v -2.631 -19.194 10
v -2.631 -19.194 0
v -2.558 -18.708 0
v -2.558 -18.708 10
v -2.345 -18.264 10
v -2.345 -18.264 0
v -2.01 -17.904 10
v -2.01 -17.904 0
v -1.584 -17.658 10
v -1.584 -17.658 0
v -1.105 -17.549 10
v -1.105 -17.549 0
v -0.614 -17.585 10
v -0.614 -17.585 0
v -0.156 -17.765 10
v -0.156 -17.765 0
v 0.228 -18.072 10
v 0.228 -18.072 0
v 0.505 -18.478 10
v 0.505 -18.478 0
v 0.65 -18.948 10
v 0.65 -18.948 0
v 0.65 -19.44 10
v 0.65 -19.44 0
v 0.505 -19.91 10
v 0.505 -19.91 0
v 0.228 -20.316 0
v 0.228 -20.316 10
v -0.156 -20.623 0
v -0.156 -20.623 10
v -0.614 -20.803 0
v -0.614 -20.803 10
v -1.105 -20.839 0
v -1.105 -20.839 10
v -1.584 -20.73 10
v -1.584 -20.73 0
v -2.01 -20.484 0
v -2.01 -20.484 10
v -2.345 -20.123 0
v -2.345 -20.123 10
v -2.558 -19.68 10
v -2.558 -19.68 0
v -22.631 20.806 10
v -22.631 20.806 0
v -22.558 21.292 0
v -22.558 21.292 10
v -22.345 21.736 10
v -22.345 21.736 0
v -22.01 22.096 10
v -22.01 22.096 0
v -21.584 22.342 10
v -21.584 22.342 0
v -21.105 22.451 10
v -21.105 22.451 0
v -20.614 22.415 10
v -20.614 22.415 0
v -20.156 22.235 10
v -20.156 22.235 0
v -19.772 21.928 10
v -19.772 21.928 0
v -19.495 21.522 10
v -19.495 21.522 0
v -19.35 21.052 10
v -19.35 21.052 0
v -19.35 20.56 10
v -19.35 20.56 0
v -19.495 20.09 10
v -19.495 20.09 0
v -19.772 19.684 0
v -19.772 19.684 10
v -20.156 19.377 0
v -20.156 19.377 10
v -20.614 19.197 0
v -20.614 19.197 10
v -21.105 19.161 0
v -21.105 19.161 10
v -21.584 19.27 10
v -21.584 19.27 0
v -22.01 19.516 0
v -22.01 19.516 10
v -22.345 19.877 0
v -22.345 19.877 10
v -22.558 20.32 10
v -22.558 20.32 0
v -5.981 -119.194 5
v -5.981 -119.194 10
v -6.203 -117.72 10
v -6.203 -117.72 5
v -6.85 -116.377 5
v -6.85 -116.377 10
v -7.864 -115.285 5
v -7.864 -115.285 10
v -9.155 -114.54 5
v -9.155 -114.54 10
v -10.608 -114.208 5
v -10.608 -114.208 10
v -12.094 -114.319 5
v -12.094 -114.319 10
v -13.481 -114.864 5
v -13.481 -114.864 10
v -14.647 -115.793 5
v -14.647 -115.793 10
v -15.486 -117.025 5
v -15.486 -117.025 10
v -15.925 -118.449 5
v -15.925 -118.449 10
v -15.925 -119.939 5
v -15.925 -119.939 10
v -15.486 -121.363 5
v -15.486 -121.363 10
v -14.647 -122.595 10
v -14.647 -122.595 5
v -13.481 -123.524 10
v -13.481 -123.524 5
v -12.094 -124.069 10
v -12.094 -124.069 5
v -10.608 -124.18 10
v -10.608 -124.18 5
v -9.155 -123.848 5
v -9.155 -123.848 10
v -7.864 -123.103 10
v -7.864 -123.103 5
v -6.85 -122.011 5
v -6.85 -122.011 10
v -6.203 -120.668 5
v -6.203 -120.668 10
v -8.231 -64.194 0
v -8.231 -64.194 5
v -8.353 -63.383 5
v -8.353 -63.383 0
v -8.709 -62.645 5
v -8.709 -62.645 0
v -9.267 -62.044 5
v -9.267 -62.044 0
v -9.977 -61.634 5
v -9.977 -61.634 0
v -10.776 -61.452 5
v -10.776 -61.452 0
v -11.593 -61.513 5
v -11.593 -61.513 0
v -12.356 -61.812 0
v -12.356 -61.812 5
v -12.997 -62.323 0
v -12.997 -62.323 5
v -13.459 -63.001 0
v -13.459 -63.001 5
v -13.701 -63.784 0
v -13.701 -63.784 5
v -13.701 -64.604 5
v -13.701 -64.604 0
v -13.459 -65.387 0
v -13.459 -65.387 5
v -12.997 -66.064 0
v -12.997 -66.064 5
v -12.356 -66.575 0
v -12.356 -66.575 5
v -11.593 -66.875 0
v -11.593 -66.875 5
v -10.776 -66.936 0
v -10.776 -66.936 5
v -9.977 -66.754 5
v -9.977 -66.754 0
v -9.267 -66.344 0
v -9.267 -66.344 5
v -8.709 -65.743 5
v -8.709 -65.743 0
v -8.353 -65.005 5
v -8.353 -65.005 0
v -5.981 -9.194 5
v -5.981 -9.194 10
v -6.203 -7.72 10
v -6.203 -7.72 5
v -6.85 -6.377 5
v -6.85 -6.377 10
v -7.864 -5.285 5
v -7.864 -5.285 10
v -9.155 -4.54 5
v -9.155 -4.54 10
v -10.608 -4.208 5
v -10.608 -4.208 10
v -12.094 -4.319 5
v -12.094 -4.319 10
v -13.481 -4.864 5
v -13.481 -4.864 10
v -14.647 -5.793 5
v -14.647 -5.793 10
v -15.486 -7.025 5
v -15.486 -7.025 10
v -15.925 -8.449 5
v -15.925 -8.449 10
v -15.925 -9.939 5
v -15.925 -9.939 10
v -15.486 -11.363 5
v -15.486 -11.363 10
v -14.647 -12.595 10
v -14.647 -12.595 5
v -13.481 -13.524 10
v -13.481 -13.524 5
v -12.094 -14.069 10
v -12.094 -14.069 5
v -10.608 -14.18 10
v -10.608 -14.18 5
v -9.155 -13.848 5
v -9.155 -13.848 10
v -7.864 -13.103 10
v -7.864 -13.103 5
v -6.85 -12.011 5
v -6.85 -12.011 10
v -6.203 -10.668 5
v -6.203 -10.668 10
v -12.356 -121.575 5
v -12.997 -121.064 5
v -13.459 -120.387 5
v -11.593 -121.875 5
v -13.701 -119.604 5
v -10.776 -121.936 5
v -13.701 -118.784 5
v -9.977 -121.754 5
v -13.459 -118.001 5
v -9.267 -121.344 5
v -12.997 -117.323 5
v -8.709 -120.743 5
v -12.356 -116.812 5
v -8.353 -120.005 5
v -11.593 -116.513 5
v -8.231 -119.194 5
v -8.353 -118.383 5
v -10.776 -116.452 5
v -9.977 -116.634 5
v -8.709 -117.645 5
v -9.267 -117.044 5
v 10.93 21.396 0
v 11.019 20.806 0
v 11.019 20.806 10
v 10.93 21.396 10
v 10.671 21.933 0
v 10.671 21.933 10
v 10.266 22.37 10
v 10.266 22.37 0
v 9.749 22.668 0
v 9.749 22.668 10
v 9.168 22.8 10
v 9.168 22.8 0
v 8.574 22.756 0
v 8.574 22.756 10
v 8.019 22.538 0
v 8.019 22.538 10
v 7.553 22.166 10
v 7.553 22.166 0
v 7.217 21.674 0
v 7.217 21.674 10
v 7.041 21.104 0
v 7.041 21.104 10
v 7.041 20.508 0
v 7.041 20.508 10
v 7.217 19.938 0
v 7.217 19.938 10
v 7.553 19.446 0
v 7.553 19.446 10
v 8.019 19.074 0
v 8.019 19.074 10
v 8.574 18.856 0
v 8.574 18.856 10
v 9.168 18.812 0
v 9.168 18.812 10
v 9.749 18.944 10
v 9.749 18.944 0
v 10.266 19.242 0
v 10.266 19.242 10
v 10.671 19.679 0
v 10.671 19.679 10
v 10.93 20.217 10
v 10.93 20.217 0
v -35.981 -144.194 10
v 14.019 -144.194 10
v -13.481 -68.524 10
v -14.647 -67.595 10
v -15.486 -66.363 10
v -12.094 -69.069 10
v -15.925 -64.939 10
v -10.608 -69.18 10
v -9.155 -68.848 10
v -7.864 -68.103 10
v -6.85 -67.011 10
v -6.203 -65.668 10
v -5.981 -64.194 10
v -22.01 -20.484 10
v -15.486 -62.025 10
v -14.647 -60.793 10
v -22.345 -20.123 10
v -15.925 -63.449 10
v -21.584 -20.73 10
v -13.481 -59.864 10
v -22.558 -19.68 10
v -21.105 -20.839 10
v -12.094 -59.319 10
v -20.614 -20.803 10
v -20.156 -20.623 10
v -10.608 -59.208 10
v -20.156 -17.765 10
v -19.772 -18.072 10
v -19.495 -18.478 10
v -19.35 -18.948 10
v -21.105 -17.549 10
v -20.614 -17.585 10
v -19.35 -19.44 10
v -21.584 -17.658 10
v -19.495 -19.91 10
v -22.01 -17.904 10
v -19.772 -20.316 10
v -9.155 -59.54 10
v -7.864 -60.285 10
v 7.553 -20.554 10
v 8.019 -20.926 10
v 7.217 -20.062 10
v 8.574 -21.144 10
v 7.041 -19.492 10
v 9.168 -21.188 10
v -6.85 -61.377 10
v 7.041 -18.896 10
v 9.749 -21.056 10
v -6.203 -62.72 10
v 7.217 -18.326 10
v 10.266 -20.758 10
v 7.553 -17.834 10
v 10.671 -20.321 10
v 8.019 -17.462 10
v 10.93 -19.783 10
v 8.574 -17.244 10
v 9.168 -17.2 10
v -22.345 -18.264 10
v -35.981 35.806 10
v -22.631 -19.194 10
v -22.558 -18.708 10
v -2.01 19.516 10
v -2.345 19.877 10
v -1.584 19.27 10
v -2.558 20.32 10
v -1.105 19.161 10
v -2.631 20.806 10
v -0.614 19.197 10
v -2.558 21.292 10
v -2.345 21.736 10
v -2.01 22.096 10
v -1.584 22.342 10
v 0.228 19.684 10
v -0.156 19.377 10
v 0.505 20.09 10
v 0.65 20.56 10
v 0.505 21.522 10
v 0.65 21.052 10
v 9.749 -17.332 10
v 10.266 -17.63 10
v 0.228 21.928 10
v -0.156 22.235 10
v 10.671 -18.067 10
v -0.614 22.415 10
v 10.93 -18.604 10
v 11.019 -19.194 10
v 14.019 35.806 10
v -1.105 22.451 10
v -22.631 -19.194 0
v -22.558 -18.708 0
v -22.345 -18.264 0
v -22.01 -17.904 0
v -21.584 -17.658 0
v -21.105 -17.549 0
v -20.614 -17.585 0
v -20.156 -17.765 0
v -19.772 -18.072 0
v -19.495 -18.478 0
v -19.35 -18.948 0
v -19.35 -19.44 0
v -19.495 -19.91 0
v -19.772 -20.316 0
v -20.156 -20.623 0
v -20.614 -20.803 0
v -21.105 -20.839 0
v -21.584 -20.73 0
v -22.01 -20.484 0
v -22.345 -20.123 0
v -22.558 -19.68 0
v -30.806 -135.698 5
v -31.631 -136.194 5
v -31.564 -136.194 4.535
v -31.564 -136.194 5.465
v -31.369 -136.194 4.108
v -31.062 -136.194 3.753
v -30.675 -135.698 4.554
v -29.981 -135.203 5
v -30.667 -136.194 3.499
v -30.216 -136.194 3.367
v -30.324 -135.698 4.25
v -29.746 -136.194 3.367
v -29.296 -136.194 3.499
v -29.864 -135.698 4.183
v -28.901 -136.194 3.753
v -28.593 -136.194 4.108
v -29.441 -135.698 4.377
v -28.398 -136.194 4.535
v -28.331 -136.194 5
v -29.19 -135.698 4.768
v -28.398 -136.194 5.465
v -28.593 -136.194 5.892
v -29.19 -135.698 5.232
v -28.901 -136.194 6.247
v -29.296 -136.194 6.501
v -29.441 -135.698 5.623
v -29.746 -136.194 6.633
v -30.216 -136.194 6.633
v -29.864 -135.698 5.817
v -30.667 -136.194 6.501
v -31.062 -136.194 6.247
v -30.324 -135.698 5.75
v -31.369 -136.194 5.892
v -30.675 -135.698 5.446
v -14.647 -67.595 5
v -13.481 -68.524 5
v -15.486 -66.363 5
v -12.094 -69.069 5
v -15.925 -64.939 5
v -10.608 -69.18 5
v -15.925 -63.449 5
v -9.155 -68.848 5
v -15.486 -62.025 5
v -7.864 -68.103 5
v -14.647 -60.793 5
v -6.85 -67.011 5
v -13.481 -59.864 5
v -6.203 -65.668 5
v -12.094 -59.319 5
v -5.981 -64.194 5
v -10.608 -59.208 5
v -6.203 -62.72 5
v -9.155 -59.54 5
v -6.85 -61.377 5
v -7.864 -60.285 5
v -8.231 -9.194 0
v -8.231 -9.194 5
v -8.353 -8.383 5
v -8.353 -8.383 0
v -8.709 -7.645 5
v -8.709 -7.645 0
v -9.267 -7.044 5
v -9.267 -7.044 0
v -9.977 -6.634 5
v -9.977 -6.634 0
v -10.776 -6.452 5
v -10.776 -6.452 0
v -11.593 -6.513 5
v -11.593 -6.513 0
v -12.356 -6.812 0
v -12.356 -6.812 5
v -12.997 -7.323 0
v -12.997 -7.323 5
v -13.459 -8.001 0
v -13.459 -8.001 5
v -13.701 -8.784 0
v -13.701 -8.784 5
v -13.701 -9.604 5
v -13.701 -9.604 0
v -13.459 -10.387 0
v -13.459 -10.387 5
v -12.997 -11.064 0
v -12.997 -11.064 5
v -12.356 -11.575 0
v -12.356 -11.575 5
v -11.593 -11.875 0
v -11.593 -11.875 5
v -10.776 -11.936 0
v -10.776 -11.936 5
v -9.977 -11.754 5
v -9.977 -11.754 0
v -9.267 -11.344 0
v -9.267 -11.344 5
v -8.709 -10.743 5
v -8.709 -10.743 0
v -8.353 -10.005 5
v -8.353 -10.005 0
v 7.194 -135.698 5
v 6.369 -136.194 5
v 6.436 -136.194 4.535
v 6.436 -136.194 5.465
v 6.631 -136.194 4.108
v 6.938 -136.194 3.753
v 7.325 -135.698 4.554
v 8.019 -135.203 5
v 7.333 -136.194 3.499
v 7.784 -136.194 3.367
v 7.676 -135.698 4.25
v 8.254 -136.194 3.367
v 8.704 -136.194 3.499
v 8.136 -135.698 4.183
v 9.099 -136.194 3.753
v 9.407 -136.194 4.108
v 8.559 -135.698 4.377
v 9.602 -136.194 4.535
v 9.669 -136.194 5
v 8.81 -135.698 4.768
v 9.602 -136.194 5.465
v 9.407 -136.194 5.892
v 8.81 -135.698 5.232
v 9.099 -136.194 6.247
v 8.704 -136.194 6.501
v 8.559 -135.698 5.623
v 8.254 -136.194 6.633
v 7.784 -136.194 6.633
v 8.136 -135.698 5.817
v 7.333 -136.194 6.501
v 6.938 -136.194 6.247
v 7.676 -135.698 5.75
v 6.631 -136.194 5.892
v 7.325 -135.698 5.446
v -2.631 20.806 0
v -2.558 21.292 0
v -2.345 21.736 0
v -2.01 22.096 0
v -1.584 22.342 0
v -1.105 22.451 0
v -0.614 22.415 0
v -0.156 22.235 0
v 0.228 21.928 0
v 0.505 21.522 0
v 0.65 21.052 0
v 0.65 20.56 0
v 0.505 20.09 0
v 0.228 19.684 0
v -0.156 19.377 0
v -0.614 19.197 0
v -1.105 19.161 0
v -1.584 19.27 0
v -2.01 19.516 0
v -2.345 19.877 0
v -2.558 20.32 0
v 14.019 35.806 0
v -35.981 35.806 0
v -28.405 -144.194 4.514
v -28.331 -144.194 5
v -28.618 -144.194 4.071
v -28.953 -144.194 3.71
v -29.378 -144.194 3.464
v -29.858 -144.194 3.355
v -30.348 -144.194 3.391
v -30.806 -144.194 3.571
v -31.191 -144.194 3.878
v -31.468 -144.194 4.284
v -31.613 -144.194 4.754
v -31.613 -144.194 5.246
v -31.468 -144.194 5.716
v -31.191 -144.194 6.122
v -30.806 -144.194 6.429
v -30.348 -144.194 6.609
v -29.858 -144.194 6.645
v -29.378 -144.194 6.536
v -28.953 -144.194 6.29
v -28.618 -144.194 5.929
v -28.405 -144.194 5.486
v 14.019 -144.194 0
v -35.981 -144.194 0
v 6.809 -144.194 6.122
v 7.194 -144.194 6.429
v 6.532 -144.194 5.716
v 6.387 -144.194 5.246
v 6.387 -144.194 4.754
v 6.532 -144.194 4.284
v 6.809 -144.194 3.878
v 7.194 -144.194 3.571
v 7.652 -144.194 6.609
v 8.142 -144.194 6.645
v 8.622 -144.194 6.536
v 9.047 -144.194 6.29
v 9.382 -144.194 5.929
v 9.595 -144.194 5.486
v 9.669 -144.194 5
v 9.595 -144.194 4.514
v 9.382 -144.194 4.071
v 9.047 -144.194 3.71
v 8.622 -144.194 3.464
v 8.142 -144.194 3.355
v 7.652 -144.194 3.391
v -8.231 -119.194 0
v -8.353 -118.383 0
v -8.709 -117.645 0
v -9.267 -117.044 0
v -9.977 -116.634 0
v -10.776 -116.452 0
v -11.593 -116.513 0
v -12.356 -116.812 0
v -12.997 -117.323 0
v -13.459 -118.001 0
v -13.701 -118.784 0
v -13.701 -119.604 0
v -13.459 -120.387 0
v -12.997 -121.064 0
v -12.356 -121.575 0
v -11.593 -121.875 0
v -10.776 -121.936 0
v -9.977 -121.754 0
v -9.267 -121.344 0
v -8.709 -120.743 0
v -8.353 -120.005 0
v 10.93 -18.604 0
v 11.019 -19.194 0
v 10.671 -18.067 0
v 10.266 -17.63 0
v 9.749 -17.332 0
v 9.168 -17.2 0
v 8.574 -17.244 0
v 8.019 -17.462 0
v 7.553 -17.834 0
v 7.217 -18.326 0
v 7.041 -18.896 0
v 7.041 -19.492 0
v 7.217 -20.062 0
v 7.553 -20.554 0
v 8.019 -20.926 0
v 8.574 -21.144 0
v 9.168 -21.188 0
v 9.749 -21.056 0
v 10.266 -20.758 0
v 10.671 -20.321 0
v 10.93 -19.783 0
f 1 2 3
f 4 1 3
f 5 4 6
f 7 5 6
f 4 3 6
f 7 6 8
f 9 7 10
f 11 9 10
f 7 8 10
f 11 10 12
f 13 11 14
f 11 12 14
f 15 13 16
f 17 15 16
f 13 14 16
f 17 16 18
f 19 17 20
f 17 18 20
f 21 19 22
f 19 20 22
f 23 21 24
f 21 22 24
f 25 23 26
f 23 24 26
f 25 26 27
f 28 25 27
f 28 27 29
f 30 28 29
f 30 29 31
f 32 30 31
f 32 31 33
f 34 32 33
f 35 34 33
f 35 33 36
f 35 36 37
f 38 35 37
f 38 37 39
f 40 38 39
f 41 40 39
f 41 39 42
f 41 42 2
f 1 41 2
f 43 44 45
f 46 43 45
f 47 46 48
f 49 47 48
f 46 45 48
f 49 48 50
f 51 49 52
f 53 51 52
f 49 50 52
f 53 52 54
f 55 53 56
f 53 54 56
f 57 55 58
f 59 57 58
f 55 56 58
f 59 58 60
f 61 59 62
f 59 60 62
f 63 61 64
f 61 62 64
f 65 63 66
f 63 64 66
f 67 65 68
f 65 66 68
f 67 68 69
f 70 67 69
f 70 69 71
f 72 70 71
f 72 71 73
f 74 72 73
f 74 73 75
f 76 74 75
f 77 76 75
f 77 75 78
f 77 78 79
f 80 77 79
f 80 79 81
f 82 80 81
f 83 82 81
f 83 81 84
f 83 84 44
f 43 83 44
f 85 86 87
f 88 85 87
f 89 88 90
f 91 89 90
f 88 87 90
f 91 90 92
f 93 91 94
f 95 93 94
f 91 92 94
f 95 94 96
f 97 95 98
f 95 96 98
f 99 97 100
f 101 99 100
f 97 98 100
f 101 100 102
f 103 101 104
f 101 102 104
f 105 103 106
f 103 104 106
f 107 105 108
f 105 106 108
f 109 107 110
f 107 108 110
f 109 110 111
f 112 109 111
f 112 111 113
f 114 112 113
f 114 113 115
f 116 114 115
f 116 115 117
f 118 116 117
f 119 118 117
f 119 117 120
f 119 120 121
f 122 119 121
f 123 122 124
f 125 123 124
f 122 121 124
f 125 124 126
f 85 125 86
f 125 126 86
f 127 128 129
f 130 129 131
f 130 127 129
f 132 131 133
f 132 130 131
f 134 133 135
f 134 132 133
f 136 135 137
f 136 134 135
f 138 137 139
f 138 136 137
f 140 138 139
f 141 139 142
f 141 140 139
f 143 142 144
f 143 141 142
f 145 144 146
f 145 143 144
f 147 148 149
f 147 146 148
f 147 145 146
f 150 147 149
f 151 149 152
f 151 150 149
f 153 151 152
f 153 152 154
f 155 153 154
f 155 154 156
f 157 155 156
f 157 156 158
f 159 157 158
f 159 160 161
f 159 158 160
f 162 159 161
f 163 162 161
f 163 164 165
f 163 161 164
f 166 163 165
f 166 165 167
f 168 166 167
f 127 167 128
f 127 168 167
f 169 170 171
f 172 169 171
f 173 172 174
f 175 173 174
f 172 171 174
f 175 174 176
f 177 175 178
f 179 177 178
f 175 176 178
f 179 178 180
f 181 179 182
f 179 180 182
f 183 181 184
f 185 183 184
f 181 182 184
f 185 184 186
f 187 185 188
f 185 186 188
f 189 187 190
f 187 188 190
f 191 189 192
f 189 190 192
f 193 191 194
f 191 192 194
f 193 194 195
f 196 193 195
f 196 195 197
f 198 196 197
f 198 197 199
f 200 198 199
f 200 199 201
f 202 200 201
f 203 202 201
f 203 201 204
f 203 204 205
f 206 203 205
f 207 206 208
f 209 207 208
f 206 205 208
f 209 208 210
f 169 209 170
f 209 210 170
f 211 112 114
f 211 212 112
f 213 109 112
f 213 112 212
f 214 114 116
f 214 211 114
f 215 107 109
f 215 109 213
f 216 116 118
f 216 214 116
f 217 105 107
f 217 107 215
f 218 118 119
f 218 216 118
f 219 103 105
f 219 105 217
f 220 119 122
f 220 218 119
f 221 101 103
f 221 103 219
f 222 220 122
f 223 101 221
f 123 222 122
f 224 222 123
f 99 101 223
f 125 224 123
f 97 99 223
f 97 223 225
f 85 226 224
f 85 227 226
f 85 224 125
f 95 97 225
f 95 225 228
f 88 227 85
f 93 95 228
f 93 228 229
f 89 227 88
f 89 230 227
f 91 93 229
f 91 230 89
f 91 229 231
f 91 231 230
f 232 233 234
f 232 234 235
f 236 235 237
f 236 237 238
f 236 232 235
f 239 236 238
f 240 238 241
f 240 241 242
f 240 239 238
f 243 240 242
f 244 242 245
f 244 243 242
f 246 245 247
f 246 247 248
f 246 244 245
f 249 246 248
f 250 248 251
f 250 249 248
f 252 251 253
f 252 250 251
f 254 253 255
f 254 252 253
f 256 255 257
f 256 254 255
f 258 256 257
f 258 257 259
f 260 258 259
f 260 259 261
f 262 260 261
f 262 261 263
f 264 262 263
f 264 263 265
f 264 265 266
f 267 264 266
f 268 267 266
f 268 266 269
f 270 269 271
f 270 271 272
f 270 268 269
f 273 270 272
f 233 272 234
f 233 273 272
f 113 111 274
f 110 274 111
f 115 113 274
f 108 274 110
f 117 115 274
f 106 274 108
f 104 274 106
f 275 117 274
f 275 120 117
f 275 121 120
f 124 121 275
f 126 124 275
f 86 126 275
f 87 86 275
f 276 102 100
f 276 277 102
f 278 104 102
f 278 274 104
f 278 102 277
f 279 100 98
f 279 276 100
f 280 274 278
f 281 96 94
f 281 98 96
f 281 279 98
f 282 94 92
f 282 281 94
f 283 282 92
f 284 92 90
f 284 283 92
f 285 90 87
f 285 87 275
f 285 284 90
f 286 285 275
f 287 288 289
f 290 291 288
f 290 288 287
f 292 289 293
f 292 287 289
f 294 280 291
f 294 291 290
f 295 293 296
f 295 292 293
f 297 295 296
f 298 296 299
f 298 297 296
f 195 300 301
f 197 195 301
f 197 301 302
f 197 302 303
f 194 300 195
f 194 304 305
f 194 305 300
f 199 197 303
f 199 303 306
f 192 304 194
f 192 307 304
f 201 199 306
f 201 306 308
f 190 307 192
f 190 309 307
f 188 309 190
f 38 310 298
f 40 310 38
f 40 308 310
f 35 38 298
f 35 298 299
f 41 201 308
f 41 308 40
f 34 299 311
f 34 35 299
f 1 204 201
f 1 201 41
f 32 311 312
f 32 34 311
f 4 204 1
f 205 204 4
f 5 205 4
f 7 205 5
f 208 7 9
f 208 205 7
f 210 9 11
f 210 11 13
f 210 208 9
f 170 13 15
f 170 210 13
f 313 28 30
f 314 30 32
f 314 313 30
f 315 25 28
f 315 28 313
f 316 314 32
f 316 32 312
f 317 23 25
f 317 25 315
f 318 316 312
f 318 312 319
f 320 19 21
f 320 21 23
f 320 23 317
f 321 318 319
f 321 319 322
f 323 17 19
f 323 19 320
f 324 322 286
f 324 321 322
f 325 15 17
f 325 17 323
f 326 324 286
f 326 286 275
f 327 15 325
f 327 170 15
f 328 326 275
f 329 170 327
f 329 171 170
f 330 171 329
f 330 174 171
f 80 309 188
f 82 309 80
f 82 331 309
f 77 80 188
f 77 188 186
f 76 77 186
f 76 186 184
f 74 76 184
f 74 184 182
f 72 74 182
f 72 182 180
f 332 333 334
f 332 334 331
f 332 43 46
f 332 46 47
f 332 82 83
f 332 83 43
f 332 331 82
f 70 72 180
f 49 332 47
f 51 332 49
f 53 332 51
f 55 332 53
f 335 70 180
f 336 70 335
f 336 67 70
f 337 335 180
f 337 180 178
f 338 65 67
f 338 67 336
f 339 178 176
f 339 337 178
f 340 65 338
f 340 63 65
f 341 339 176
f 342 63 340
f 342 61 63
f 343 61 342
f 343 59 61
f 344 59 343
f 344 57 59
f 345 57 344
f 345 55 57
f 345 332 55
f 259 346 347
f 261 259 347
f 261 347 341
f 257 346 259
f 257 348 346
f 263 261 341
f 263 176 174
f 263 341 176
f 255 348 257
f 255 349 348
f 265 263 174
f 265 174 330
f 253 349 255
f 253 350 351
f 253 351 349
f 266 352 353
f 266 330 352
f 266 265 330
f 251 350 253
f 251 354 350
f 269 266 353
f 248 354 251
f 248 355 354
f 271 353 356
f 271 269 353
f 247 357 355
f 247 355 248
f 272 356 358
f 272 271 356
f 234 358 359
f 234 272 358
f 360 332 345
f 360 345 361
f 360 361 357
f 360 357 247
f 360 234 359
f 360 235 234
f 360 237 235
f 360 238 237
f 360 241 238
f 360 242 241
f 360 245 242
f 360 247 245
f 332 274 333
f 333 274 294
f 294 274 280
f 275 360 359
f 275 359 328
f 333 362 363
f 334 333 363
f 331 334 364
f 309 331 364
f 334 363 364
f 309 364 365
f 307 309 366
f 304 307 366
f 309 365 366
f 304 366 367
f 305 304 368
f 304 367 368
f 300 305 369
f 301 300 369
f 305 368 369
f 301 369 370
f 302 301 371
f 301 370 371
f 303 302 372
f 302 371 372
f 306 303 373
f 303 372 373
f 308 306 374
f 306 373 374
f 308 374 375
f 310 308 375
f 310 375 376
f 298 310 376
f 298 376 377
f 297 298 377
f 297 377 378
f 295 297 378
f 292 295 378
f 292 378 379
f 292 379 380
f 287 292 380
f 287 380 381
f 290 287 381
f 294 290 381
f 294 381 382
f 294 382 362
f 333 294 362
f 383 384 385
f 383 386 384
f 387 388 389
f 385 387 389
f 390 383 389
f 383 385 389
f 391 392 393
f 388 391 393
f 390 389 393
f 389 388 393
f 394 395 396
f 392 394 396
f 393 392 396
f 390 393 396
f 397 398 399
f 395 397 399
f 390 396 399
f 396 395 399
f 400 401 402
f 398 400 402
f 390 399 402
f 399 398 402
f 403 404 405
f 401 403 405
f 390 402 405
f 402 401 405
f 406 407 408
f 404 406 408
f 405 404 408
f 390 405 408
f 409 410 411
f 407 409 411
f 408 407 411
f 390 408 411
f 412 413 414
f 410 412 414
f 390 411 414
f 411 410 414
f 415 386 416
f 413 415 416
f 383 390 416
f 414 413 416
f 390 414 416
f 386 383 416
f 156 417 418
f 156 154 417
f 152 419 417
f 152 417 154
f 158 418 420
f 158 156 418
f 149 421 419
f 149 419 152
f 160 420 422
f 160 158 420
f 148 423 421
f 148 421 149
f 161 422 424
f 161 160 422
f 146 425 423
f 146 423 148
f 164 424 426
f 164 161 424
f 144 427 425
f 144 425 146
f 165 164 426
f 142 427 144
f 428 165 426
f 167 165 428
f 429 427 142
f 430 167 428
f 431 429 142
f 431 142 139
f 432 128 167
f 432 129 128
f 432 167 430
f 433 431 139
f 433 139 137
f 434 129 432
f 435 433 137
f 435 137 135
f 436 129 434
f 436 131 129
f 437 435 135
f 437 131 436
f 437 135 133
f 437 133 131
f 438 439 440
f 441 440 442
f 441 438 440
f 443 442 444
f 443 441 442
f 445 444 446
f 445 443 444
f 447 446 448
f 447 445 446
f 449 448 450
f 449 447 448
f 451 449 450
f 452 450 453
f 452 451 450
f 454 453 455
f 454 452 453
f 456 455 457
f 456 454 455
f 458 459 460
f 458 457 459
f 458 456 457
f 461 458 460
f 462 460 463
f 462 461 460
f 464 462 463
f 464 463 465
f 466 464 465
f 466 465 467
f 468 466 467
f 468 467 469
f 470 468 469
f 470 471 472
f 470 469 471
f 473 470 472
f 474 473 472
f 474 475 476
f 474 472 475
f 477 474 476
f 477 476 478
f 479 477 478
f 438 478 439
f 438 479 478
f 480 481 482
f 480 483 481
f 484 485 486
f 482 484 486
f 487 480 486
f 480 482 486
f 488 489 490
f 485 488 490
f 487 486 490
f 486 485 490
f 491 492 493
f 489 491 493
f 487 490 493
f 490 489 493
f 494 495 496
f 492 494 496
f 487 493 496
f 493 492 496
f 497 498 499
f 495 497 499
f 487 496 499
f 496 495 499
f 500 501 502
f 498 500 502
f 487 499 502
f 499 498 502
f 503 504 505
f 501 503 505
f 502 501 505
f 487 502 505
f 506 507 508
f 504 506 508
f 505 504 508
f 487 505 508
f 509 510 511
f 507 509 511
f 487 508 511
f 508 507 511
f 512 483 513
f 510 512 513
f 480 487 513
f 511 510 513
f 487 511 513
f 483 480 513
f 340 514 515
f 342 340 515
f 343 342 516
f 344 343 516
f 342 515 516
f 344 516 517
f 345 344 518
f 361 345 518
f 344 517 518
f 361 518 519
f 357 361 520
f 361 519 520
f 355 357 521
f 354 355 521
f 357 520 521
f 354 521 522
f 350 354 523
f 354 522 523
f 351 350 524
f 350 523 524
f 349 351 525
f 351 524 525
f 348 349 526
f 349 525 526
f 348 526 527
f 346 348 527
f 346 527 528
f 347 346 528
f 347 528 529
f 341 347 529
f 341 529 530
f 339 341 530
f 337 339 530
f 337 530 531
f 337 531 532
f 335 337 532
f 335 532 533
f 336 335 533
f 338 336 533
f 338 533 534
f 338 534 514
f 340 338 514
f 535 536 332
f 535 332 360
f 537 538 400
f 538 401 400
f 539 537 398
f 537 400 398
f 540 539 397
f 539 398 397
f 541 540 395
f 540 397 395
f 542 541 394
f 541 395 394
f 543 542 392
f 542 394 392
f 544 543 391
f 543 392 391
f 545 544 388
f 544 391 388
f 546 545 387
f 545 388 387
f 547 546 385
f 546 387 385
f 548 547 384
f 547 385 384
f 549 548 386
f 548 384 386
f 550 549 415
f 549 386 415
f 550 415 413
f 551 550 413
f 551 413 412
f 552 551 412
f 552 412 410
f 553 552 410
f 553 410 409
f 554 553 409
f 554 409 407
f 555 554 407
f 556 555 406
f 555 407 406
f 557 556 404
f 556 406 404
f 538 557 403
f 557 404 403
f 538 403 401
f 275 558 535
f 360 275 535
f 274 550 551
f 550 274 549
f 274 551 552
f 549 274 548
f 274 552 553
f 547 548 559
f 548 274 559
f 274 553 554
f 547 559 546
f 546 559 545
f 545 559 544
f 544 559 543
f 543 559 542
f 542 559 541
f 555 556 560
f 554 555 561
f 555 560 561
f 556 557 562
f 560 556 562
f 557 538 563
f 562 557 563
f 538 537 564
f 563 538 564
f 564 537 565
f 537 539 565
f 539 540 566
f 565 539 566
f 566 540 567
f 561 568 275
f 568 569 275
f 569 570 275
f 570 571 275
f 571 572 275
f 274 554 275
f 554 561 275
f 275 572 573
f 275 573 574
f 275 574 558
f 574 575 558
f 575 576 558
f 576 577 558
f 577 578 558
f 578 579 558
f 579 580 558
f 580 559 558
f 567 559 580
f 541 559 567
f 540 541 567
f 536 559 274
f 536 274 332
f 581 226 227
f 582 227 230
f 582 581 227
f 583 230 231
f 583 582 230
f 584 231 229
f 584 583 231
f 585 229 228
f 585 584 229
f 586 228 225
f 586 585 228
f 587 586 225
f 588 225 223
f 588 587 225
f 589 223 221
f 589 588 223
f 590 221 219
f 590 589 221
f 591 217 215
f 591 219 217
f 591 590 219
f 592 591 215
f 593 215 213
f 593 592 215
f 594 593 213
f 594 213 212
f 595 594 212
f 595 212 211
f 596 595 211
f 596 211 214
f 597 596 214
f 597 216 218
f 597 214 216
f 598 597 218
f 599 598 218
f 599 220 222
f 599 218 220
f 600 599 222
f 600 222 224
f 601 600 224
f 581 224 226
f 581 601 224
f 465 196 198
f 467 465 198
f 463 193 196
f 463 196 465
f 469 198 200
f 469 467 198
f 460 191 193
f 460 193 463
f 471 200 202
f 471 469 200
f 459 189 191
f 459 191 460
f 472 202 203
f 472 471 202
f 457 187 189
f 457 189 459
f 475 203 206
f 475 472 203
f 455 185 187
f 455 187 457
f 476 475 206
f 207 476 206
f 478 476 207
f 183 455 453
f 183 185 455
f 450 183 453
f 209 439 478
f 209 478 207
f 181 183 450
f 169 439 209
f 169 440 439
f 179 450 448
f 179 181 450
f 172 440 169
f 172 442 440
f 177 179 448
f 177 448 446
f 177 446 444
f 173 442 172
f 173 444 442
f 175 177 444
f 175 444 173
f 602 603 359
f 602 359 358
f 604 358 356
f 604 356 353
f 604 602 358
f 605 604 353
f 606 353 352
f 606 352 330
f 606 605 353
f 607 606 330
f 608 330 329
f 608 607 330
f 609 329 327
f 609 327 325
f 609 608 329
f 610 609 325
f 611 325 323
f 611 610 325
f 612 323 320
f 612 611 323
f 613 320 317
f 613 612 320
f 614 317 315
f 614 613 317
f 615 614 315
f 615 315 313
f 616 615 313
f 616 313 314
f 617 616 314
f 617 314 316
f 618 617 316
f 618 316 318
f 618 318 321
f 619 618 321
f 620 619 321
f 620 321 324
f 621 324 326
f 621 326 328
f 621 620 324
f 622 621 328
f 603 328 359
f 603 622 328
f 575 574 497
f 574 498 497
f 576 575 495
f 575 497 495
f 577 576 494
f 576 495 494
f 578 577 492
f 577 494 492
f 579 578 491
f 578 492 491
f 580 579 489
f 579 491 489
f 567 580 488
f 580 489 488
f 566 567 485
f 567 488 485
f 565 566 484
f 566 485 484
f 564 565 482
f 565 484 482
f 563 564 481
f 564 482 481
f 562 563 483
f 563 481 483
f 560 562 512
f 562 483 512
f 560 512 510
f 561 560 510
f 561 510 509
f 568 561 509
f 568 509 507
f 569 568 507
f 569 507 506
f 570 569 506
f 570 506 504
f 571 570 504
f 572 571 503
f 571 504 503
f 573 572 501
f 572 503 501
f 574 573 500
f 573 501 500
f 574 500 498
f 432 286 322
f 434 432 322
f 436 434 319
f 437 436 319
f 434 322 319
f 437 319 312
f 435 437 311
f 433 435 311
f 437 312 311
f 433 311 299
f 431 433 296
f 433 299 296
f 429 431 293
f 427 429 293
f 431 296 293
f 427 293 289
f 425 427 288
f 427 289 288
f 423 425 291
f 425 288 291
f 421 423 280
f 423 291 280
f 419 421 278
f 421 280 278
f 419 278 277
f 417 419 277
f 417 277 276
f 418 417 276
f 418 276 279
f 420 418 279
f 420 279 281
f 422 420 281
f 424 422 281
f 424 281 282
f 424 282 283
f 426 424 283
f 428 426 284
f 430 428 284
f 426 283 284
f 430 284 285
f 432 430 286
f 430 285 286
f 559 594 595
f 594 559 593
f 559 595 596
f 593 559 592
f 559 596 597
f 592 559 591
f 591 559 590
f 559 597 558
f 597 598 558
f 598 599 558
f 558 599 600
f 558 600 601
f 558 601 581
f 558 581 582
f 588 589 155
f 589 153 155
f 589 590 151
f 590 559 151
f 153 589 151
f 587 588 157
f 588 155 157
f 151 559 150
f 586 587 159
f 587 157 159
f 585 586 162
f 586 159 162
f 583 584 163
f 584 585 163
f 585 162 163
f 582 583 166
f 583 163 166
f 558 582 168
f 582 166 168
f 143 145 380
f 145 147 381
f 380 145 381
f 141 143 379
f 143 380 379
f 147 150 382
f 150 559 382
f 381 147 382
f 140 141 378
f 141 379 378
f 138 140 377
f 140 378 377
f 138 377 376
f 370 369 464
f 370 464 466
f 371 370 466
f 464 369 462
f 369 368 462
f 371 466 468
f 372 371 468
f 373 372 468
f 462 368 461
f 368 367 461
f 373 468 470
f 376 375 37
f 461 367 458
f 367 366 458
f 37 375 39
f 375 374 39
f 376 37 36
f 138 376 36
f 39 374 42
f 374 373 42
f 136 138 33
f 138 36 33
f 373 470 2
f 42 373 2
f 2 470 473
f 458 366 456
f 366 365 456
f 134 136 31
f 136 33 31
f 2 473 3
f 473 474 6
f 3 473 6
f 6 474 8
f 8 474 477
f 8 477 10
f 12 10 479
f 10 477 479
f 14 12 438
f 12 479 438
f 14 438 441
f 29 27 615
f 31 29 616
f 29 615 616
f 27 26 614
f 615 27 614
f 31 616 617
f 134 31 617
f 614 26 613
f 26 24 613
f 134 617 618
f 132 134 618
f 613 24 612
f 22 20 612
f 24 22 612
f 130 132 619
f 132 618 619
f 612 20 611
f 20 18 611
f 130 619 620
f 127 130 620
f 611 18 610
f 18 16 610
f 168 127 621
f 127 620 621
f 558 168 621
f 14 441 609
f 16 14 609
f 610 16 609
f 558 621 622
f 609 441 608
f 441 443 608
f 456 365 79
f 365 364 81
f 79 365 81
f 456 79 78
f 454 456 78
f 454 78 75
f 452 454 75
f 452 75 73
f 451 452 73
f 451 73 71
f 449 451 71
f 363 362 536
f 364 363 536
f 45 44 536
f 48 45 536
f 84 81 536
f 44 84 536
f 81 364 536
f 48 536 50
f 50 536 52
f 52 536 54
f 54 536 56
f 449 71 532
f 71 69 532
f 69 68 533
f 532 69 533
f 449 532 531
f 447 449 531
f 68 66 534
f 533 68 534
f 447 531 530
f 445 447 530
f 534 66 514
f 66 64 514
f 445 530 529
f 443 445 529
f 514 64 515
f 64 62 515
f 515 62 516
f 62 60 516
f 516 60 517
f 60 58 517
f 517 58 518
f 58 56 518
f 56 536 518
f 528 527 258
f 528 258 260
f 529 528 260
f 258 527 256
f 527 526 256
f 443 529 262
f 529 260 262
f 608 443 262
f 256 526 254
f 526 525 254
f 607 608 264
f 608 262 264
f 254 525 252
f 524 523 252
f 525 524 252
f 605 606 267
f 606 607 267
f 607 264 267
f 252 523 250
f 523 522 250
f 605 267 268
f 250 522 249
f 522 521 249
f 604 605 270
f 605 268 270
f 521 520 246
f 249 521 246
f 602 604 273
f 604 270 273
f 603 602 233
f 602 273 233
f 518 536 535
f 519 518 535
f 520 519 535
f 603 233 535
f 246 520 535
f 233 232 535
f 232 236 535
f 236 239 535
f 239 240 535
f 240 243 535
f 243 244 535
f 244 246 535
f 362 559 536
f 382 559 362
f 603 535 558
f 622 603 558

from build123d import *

# Parameters (mm, degrees)
SKETCH1_W             = 50
SKETCH1_H             = 180
SKETCH1_R             = 2.75
SKETCH1_R_2           = 2
BOSS_EXTRUDE1_DEPTH   = 10
SKETCH2_R             = 5
CUT_EXTRUDE1_DEPTH    = 5
M4_TAPPED_HOLE1_D     = 3.3
M4_TAPPED_HOLE2_D     = 3.3
M4_TAPPED_HOLE2_DEPTH = 8
M4_TAPPED_HOLE2_TIP   = 0.991420021


with BuildPart() as part:
    # Sketch1 → Boss-Extrude1 (new body)
    with BuildSketch(Plane.XY):
        with Locations((-10.981308411, -54.193925234)):
            Rectangle(SKETCH1_W, SKETCH1_H)
        with Locations((-10.981308411, -119.193925234)):
            Circle(SKETCH1_R, mode=Mode.SUBTRACT)
        with Locations((-10.981308411, -64.193925234)):
            Circle(SKETCH1_R, mode=Mode.SUBTRACT)
        with Locations((-10.981308411, -9.193925234)):
            Circle(SKETCH1_R, mode=Mode.SUBTRACT)
        with Locations((9.018691589, 20.806074766)):
            Circle(SKETCH1_R_2, mode=Mode.SUBTRACT)
        with Locations((9.018691589, -19.193925234)):
            Circle(SKETCH1_R_2, mode=Mode.SUBTRACT)
    extrude(amount=BOSS_EXTRUDE1_DEPTH)

    # Sketch2 → Cut-Extrude1 (cut)
    with BuildSketch(Plane.XY.offset(10)):
        with Locations((-10.981308411, -9.193925234)):
            Circle(SKETCH2_R)
        with Locations((-10.981308411, -64.193925234)):
            Circle(SKETCH2_R)
        with Locations((-10.981308411, -119.193925234)):
            Circle(SKETCH2_R)
    extrude(amount=-CUT_EXTRUDE1_DEPTH, mode=Mode.SUBTRACT)

    # M4 Tapped Hole1 (through all)
    with Locations(Plane.XY.offset(10)):
        with Locations((-0.981308411, -19.193925234), (-20.981308411, -19.193925234), (-20.981308411, 20.806074766), (-0.981308411, 20.806074766)):
            Hole(M4_TAPPED_HOLE1_D / 2)

    # M4 Tapped Hole2
    with Locations(Plane(origin=(0, -144.193925234, 0), x_dir=(-1, 0, 0), z_dir=(0, -1, 0))):
        with Locations((29.981308411, -5), (-8.018691589, -5)):
            Hole(M4_TAPPED_HOLE2_D / 2, depth=M4_TAPPED_HOLE2_DEPTH)
            with Locations((0, 0, -(M4_TAPPED_HOLE2_DEPTH + M4_TAPPED_HOLE2_TIP / 2))):  # 118° drill point
                Cone(0, M4_TAPPED_HOLE2_D / 2, M4_TAPPED_HOLE2_TIP, mode=Mode.SUBTRACT)


solid = part.part
